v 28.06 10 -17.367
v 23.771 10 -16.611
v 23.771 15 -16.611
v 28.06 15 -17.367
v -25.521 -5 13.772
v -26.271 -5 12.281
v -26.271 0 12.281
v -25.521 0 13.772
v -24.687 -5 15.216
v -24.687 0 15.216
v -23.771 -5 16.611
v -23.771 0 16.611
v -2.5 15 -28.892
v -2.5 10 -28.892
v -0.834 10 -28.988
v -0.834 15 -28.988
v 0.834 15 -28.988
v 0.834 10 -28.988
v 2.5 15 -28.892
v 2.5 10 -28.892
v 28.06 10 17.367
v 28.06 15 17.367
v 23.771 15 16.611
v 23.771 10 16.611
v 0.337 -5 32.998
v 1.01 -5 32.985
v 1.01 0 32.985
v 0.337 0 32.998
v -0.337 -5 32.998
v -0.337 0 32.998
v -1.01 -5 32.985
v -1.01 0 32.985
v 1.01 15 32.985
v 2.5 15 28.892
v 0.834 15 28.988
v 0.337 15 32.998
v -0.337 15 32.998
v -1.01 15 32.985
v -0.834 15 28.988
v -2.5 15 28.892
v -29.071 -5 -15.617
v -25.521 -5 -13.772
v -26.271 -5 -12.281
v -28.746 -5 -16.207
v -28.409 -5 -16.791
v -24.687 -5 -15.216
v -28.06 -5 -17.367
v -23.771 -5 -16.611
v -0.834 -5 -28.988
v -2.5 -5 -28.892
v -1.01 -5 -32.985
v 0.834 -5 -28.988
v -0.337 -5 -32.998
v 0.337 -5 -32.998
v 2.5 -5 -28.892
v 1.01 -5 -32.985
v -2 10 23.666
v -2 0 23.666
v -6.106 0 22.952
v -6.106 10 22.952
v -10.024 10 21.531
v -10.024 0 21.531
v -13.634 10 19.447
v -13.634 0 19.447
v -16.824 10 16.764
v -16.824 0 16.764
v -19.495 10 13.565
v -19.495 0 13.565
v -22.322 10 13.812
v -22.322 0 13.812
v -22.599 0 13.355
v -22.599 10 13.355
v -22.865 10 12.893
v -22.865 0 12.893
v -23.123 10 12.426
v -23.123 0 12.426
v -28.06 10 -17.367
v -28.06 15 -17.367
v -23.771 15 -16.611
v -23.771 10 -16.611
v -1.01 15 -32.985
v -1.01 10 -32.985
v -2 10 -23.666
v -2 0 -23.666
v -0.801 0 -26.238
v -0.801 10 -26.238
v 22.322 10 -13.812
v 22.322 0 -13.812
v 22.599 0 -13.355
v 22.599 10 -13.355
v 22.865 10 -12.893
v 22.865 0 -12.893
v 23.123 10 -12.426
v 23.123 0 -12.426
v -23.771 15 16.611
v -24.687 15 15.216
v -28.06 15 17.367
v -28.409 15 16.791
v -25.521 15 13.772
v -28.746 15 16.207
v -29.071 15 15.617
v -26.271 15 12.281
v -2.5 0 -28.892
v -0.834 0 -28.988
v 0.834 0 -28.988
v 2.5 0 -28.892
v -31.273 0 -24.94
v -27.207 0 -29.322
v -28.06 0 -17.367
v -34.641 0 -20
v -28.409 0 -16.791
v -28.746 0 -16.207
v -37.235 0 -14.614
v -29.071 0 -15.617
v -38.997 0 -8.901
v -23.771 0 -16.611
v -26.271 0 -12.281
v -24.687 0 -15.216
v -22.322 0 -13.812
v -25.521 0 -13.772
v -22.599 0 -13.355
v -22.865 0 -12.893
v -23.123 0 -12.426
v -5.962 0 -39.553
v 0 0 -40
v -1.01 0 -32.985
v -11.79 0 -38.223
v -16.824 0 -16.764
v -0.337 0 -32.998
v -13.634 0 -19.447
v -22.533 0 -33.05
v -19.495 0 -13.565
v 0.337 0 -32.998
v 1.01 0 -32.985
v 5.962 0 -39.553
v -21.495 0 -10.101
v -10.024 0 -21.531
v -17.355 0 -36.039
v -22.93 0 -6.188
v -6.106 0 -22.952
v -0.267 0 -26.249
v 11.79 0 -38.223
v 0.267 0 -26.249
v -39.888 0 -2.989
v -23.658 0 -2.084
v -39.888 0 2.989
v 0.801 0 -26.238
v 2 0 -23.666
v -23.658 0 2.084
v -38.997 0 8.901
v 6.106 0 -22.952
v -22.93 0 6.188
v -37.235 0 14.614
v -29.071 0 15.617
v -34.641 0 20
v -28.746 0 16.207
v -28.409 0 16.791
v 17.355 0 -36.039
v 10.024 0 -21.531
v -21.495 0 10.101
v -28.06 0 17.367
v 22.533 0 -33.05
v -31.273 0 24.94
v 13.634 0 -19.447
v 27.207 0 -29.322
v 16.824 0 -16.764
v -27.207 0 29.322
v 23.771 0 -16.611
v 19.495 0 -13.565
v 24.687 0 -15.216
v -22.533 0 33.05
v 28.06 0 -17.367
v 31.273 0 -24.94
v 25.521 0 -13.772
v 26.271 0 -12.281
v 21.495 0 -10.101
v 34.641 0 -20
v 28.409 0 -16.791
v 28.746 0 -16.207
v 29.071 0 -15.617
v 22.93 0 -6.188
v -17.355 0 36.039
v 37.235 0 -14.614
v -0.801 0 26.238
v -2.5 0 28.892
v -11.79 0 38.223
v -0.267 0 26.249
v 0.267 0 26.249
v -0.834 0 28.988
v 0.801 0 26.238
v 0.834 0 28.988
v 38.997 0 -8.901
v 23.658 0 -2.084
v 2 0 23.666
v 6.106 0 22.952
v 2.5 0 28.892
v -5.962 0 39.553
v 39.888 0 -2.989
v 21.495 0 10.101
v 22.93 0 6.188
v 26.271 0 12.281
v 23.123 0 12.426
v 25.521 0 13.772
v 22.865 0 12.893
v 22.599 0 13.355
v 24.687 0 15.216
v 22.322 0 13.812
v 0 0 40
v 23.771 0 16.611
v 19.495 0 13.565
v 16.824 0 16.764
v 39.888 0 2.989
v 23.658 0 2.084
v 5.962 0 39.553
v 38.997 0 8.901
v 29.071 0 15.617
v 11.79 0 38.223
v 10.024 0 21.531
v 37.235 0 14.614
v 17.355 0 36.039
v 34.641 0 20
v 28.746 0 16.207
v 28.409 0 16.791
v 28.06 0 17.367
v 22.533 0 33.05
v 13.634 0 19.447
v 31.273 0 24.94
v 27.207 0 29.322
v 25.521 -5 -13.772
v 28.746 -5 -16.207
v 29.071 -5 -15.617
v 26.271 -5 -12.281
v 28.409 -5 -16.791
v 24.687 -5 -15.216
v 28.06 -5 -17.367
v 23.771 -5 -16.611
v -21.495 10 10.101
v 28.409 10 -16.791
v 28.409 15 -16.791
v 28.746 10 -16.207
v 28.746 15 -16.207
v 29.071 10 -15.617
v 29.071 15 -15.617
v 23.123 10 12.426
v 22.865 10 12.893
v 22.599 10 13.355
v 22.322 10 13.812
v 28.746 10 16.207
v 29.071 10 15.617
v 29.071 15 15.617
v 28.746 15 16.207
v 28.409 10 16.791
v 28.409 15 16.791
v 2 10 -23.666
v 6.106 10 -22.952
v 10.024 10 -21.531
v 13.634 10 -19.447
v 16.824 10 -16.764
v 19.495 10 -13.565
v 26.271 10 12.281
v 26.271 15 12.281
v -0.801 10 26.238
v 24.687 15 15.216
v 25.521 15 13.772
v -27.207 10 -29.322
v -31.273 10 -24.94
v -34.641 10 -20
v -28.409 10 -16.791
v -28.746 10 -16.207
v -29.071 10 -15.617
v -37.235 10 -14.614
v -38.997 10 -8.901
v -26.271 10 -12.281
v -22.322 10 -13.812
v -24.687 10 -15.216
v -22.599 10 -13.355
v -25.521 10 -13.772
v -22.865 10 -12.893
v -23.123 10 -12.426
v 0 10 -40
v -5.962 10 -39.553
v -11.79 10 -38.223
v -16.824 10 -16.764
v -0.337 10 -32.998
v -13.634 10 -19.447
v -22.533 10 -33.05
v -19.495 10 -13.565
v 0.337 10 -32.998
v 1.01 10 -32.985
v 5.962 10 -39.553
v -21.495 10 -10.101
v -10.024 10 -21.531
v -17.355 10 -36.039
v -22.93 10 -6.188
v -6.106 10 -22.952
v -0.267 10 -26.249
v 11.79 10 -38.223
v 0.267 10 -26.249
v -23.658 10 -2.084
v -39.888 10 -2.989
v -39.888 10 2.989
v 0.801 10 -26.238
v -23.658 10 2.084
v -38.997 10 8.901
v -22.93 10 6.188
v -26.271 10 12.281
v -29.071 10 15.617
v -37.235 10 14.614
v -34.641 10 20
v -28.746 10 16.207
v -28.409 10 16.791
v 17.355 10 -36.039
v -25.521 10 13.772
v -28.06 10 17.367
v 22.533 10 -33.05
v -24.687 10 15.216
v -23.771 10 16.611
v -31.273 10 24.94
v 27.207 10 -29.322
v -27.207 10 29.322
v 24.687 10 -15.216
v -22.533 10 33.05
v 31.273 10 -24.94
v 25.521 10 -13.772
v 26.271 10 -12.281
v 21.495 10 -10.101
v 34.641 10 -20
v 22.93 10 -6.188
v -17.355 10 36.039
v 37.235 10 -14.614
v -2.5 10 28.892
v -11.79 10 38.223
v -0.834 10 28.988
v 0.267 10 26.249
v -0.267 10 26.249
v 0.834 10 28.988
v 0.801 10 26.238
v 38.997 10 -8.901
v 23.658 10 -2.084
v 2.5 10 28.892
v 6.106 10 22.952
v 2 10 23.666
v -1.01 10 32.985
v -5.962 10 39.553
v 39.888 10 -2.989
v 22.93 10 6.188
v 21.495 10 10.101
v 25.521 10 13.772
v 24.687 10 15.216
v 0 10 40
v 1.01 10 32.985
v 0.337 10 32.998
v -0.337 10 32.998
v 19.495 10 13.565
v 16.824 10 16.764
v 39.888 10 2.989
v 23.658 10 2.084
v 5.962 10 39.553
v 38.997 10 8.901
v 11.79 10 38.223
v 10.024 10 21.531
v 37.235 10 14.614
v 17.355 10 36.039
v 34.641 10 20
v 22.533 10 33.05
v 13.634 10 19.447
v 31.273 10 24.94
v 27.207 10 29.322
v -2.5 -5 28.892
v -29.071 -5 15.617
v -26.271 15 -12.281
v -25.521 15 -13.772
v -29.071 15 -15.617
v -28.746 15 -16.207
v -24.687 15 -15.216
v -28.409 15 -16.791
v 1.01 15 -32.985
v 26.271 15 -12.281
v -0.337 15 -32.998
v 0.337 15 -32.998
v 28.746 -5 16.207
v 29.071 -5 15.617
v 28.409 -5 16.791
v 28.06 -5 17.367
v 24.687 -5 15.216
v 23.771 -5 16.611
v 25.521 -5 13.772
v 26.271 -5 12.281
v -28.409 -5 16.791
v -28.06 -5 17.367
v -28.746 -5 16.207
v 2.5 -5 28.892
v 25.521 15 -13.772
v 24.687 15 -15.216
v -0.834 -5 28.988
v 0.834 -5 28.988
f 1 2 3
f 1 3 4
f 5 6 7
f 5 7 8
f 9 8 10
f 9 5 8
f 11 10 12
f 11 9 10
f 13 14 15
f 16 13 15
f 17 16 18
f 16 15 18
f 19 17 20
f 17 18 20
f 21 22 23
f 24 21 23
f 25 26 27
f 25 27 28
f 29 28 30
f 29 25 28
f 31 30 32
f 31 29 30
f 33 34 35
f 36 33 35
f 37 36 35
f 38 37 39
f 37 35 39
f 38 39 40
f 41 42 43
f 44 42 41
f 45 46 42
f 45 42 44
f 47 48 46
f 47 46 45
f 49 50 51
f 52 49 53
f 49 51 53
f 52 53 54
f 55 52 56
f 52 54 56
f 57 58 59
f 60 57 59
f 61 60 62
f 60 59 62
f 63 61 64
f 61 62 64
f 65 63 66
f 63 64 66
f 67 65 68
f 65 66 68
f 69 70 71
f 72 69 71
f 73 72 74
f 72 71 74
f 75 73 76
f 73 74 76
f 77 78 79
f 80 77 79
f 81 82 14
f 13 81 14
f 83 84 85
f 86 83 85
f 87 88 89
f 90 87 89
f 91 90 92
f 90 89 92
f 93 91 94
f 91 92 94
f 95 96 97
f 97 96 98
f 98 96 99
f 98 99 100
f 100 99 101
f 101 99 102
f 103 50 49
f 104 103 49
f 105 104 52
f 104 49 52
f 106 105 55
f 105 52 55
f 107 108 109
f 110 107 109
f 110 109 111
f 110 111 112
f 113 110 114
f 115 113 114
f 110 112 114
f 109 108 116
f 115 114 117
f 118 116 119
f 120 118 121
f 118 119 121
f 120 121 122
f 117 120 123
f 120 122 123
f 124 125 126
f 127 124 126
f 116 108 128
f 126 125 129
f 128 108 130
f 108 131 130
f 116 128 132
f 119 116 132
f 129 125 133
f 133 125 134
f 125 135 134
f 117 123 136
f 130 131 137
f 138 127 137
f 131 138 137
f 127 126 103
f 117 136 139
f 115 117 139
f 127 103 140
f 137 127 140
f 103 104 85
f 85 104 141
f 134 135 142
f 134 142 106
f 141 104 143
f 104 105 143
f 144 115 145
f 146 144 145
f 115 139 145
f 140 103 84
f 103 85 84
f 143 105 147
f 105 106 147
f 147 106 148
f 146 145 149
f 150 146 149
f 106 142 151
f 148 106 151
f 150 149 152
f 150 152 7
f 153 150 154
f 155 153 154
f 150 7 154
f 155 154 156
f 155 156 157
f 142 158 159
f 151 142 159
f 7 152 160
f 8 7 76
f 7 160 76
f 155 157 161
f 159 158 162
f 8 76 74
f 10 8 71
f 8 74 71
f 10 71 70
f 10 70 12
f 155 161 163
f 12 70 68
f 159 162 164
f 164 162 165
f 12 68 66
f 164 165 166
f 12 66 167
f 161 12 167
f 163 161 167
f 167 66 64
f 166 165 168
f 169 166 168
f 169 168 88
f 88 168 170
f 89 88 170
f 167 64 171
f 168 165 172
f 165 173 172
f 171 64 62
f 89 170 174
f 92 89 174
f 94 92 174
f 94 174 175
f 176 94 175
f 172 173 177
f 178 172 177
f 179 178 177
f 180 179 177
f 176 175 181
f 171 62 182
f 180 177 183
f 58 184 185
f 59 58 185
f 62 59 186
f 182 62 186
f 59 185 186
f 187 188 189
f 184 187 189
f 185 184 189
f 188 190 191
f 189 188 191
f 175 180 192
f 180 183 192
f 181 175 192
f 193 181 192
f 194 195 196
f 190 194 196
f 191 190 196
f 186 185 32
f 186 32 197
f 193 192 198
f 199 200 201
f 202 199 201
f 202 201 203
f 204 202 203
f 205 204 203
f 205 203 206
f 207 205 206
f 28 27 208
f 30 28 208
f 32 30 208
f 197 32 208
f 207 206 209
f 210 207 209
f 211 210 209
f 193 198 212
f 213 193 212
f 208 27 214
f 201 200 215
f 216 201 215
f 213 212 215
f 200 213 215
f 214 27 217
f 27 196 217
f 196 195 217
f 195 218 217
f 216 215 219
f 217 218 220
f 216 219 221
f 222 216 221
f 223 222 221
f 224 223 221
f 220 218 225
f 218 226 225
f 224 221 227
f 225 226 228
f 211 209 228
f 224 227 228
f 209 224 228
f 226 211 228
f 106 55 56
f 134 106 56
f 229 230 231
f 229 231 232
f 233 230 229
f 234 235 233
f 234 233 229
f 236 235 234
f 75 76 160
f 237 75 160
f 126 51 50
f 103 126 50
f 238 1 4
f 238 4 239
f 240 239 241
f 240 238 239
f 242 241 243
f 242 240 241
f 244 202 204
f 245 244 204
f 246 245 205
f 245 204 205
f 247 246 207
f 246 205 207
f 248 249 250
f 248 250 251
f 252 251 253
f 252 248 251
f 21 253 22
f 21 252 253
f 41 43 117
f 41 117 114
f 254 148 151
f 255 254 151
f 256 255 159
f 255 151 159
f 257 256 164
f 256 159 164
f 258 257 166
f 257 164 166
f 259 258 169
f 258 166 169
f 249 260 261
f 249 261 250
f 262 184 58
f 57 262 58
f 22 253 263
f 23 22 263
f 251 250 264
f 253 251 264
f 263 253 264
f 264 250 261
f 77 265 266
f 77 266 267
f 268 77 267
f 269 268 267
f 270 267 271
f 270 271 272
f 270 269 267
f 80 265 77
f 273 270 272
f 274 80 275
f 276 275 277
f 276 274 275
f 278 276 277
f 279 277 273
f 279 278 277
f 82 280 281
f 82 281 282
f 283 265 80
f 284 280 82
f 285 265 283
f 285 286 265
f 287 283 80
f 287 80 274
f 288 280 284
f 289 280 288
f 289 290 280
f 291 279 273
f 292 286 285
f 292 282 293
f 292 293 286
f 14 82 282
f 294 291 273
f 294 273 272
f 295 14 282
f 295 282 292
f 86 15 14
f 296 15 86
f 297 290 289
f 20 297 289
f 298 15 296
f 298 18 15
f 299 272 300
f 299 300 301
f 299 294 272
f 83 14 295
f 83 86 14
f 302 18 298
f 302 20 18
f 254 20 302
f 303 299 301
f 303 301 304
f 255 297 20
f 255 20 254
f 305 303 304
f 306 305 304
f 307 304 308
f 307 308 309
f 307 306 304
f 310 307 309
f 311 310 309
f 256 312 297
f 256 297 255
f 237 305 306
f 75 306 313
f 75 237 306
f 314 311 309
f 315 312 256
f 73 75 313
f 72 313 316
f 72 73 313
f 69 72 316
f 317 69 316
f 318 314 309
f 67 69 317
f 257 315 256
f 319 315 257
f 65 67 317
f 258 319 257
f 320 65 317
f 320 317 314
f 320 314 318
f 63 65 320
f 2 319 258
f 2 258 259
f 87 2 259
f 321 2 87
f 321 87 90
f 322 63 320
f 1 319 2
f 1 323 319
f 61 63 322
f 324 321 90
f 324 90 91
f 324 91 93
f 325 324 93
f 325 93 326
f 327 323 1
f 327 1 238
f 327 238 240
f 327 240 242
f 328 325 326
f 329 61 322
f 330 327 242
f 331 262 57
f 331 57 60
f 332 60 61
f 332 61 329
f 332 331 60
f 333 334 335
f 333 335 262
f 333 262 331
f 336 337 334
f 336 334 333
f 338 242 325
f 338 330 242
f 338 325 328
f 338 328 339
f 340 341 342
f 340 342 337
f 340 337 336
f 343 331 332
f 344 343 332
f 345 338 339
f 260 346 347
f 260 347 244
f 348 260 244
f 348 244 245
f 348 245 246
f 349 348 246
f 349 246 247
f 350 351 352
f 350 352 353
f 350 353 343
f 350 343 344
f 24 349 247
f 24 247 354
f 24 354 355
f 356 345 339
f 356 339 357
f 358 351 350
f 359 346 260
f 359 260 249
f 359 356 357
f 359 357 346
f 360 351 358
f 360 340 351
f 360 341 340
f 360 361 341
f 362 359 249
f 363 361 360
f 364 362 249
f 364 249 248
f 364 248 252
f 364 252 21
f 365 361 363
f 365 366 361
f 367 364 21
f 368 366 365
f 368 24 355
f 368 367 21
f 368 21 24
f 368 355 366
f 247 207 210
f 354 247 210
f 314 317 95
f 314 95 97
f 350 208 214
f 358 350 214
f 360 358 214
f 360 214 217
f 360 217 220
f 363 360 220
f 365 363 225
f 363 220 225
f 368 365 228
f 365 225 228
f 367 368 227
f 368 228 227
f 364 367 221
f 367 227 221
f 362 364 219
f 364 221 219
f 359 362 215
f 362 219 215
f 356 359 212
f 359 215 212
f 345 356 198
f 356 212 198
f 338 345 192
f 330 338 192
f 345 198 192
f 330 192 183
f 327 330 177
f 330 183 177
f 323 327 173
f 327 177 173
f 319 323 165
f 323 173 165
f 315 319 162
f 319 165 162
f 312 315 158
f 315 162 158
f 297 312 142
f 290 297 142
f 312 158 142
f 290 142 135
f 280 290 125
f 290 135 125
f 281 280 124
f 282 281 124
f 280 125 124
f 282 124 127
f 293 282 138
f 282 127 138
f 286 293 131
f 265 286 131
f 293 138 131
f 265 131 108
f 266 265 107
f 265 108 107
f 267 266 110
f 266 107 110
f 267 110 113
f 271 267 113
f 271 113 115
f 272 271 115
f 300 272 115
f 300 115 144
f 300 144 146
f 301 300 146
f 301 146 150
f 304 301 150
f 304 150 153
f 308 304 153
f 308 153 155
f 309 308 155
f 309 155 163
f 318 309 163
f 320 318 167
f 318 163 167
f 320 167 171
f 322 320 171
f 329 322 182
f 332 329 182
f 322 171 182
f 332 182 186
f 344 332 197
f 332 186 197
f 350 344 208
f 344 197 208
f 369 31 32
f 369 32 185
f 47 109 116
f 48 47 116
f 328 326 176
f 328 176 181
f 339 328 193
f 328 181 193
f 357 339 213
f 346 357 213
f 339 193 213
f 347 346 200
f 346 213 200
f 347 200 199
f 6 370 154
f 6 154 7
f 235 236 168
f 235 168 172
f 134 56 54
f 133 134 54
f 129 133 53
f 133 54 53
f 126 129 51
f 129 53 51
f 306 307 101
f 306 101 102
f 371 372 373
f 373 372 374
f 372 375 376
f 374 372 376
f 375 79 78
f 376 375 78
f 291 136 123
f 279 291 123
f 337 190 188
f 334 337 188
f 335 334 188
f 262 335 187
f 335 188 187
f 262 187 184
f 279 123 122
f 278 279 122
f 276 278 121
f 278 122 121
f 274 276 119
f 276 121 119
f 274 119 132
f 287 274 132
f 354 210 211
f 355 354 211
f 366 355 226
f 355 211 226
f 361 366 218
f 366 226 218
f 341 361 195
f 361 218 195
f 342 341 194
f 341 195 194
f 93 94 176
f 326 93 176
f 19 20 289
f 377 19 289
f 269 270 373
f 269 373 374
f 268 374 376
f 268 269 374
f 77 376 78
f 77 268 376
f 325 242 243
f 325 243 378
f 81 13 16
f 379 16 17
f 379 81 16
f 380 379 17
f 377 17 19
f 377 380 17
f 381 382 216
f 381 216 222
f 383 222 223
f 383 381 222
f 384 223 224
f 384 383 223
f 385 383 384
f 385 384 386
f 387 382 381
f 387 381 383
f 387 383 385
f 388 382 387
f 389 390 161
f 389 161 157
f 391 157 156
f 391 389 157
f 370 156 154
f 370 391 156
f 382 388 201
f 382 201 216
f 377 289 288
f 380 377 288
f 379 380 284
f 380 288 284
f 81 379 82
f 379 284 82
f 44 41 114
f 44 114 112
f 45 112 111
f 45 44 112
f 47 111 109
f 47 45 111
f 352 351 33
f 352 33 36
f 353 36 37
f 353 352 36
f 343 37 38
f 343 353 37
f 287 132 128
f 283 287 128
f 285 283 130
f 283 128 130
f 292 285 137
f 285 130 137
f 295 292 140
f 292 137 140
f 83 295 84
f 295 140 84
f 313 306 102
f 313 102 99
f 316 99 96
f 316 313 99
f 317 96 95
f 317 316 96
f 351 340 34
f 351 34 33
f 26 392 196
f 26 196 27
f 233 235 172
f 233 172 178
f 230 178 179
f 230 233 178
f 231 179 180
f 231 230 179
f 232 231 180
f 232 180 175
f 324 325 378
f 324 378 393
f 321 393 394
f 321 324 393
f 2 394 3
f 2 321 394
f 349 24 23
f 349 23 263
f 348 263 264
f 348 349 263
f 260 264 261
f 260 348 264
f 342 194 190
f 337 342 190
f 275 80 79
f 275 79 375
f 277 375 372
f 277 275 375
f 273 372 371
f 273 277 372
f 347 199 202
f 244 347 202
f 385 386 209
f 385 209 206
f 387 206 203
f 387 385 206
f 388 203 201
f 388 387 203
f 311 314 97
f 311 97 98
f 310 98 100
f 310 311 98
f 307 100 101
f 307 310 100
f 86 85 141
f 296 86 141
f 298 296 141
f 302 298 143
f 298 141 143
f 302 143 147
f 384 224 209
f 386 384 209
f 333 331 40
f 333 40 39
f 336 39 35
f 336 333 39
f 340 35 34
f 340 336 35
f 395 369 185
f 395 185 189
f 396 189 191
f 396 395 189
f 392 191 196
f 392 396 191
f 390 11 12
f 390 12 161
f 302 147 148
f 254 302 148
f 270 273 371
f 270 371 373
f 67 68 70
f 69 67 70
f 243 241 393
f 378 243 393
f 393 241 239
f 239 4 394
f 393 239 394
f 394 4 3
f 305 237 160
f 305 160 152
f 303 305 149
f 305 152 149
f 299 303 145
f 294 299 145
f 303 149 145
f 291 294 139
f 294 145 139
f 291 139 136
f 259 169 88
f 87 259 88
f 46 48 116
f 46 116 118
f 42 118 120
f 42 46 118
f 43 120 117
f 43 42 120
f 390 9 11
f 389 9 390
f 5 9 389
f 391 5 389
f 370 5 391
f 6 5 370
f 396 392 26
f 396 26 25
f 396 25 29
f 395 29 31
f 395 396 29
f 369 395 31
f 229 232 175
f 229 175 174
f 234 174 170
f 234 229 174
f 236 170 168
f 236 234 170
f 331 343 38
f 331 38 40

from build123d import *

# Parameters (mm, degrees)
SKETCH1_R           = 40
BOSS_EXTRUDE1_DEPTH = 10
BOSS_EXTRUDE6_DEPTH = 5
BOSS_EXTRUDE7_START = -15
BOSS_EXTRUDE7_DEPTH = 5


with BuildPart() as part:
    # Sketch1 → Boss-Extrude1 (new body)
    with BuildSketch(Plane(origin=(0, 0, 0), x_dir=(1, 0, 0), z_dir=(0, 1, 0))):
        with Locations(Location((0, 0, 0), (0, 0, 270))):
            Circle(SKETCH1_R)
        with BuildLine():
            Line((-2, 23.665639649), (-0.800587161, 26.237788783))
            ThreePointArc((-0.800587161, 26.237788783), (0, 26.25), (0.800587161, 26.237788783))
            Line((0.800587161, 26.237788783), (2, 23.665639649))
            ThreePointArc((2, 23.665639649), (11.875, 20.56810334), (19.495045133, 13.564870632))
            Line((19.495045133, 13.564870632), (22.322298044, 13.812223211))
            ThreePointArc((22.322298044, 13.812223211), (22.733166849, 13.125), (23.122885205, 12.425565572))
            Line((23.122885205, 12.425565572), (21.495045133, 10.100769017))
            ThreePointArc((21.495045133, 10.100769017), (23.75, 0), (21.495045133, -10.100769017))
            Line((21.495045133, -10.100769017), (23.122885205, -12.425565572))
            ThreePointArc((23.122885205, -12.425565572), (22.733166849, -13.125), (22.322298044, -13.812223211))
            Line((22.322298044, -13.812223211), (19.495045133, -13.564870632))
            ThreePointArc((19.495045133, -13.564870632), (11.875, -20.56810334), (2, -23.665639649))
            Line((2, -23.665639649), (0.800587161, -26.237788783))
            ThreePointArc((0.800587161, -26.237788783), (0, -26.25), (-0.800587161, -26.237788783))
            Line((-0.800587161, -26.237788783), (-2, -23.665639649))
            ThreePointArc((-2, -23.665639649), (-11.875, -20.56810334), (-19.495045133, -13.564870632))
            Line((-19.495045133, -13.564870632), (-22.322298044, -13.812223211))
            ThreePointArc((-22.322298044, -13.812223211), (-22.733166849, -13.125), (-23.122885205, -12.425565572))
            Line((-23.122885205, -12.425565572), (-21.495045133, -10.100769017))
            ThreePointArc((-21.495045133, -10.100769017), (-23.75, 0), (-21.495045133, 10.100769017))
            Line((-21.495045133, 10.100769017), (-23.122885205, 12.425565572))
            ThreePointArc((-23.122885205, 12.425565572), (-22.733166849, 13.125), (-22.322298044, 13.812223211))
            Line((-22.322298044, 13.812223211), (-19.495045133, 13.564870632))
            ThreePointArc((-19.495045133, 13.564870632), (-11.875, 20.56810334), (-2, 23.665639649))
        make_face(mode=Mode.SUBTRACT)
    extrude(amount=BOSS_EXTRUDE1_DEPTH)

    # 4,5,6 → Boss-Extrude6 (add)
    with BuildSketch(Plane(origin=(0, 10, 0), x_dir=(1, 0, 0), z_dir=(0, 1, 0))):
        with BuildLine():
            Line((2.5, 28.892040426), (1.010456949, 32.984526323))
            ThreePointArc((1.010456949, 32.984526323), (0, 33), (-1.010456949, 32.984526323))
            Line((-1.010456949, 32.984526323), (-2.5, 28.892040426))
            ThreePointArc((-2.5, 28.892040426), (0, 29), (2.5, 28.892040426))
        make_face()
        with BuildLine():
            Line((23.771240976, 16.611083723), (28.060209253, 17.367344549))
            ThreePointArc((28.060209253, 17.367344549), (28.578838325, 16.5), (29.070666202, 15.617181774))
            Line((29.070666202, 15.617181774), (26.271240976, 12.280956704))
            ThreePointArc((26.271240976, 12.280956704), (25.11473671, 14.5), (23.771240976, 16.611083723))
        make_face()
        with BuildLine():
            Line((26.271240976, -12.280956704), (29.070666202, -15.617181774))
            ThreePointArc((29.070666202, -15.617181774), (28.578838325, -16.5), (28.060209253, -17.367344549))
            Line((28.060209253, -17.367344549), (23.771240976, -16.611083723))
            ThreePointArc((23.771240976, -16.611083723), (25.11473671, -14.5), (26.271240976, -12.280956704))
        make_face()
        with BuildLine():
            Line((2.5, -28.892040426), (1.010456949, -32.984526323))
            ThreePointArc((1.010456949, -32.984526323), (0, -33), (-1.010456949, -32.984526323))
            Line((-1.010456949, -32.984526323), (-2.5, -28.892040426))
            ThreePointArc((-2.5, -28.892040426), (0, -29), (2.5, -28.892040426))
        make_face()
        with BuildLine():
            Line((-23.771240976, -16.611083723), (-28.060209253, -17.367344549))
            ThreePointArc((-28.060209253, -17.367344549), (-28.578838325, -16.5), (-29.070666202, -15.617181774))
            Line((-29.070666202, -15.617181774), (-26.271240976, -12.280956704))
            ThreePointArc((-26.271240976, -12.280956704), (-25.11473671, -14.5), (-23.771240976, -16.611083723))
        make_face()
        with BuildLine():
            Line((-26.271240976, 12.280956704), (-29.070666202, 15.617181774))
            ThreePointArc((-29.070666202, 15.617181774), (-28.578838325, 16.5), (-28.060209253, 17.367344549))
            Line((-28.060209253, 17.367344549), (-23.771240976, 16.611083723))
            ThreePointArc((-23.771240976, 16.611083723), (-25.11473671, 14.5), (-26.271240976, 12.280956704))
        make_face()
    extrude(amount=BOSS_EXTRUDE6_DEPTH)

    # 4,5,6<2> → Boss-Extrude7 (add)
    with BuildSketch(Plane(origin=(0, 10, 0), x_dir=(1, 0, 0), z_dir=(0, 1, 0)).offset(BOSS_EXTRUDE7_START)):
        with BuildLine():
            Line((2.5, 28.892040426), (1.010456949, 32.984526323))
            ThreePointArc((1.010456949, 32.984526323), (0, 33), (-1.010456949, 32.984526323))
            Line((-1.010456949, 32.984526323), (-2.5, 28.892040426))
            ThreePointArc((-2.5, 28.892040426), (0, 29), (2.5, 28.892040426))
        make_face()
        with BuildLine():
            Line((23.771240976, 16.611083723), (28.060209253, 17.367344549))
            ThreePointArc((28.060209253, 17.367344549), (28.578838325, 16.5), (29.070666202, 15.617181774))
            Line((29.070666202, 15.617181774), (26.271240976, 12.280956704))
            ThreePointArc((26.271240976, 12.280956704), (25.11473671, 14.5), (23.771240976, 16.611083723))
        make_face()
        with BuildLine():
            Line((26.271240976, -12.280956704), (29.070666202, -15.617181774))
            ThreePointArc((29.070666202, -15.617181774), (28.578838325, -16.5), (28.060209253, -17.367344549))
            Line((28.060209253, -17.367344549), (23.771240976, -16.611083723))
            ThreePointArc((23.771240976, -16.611083723), (25.11473671, -14.5), (26.271240976, -12.280956704))
        make_face()
        with BuildLine():
            Line((2.5, -28.892040426), (1.010456949, -32.984526323))
            ThreePointArc((1.010456949, -32.984526323), (0, -33), (-1.010456949, -32.984526323))
            Line((-1.010456949, -32.984526323), (-2.5, -28.892040426))
            ThreePointArc((-2.5, -28.892040426), (0, -29), (2.5, -28.892040426))
        make_face()
        with BuildLine():
            Line((-23.771240976, -16.611083723), (-28.060209253, -17.367344549))
            ThreePointArc((-28.060209253, -17.367344549), (-28.578838325, -16.5), (-29.070666202, -15.617181774))
            Line((-29.070666202, -15.617181774), (-26.271240976, -12.280956704))
            ThreePointArc((-26.271240976, -12.280956704), (-25.11473671, -14.5), (-23.771240976, -16.611083723))
        make_face()
        with BuildLine():
            Line((-26.271240976, 12.280956704), (-29.070666202, 15.617181774))
            ThreePointArc((-29.070666202, 15.617181774), (-28.578838325, 16.5), (-28.060209253, 17.367344549))
            Line((-28.060209253, 17.367344549), (-23.771240976, 16.611083723))
            ThreePointArc((-23.771240976, 16.611083723), (-25.11473671, 14.5), (-26.271240976, 12.280956704))
        make_face()
    extrude(amount=BOSS_EXTRUDE7_DEPTH)


solid = part.part
